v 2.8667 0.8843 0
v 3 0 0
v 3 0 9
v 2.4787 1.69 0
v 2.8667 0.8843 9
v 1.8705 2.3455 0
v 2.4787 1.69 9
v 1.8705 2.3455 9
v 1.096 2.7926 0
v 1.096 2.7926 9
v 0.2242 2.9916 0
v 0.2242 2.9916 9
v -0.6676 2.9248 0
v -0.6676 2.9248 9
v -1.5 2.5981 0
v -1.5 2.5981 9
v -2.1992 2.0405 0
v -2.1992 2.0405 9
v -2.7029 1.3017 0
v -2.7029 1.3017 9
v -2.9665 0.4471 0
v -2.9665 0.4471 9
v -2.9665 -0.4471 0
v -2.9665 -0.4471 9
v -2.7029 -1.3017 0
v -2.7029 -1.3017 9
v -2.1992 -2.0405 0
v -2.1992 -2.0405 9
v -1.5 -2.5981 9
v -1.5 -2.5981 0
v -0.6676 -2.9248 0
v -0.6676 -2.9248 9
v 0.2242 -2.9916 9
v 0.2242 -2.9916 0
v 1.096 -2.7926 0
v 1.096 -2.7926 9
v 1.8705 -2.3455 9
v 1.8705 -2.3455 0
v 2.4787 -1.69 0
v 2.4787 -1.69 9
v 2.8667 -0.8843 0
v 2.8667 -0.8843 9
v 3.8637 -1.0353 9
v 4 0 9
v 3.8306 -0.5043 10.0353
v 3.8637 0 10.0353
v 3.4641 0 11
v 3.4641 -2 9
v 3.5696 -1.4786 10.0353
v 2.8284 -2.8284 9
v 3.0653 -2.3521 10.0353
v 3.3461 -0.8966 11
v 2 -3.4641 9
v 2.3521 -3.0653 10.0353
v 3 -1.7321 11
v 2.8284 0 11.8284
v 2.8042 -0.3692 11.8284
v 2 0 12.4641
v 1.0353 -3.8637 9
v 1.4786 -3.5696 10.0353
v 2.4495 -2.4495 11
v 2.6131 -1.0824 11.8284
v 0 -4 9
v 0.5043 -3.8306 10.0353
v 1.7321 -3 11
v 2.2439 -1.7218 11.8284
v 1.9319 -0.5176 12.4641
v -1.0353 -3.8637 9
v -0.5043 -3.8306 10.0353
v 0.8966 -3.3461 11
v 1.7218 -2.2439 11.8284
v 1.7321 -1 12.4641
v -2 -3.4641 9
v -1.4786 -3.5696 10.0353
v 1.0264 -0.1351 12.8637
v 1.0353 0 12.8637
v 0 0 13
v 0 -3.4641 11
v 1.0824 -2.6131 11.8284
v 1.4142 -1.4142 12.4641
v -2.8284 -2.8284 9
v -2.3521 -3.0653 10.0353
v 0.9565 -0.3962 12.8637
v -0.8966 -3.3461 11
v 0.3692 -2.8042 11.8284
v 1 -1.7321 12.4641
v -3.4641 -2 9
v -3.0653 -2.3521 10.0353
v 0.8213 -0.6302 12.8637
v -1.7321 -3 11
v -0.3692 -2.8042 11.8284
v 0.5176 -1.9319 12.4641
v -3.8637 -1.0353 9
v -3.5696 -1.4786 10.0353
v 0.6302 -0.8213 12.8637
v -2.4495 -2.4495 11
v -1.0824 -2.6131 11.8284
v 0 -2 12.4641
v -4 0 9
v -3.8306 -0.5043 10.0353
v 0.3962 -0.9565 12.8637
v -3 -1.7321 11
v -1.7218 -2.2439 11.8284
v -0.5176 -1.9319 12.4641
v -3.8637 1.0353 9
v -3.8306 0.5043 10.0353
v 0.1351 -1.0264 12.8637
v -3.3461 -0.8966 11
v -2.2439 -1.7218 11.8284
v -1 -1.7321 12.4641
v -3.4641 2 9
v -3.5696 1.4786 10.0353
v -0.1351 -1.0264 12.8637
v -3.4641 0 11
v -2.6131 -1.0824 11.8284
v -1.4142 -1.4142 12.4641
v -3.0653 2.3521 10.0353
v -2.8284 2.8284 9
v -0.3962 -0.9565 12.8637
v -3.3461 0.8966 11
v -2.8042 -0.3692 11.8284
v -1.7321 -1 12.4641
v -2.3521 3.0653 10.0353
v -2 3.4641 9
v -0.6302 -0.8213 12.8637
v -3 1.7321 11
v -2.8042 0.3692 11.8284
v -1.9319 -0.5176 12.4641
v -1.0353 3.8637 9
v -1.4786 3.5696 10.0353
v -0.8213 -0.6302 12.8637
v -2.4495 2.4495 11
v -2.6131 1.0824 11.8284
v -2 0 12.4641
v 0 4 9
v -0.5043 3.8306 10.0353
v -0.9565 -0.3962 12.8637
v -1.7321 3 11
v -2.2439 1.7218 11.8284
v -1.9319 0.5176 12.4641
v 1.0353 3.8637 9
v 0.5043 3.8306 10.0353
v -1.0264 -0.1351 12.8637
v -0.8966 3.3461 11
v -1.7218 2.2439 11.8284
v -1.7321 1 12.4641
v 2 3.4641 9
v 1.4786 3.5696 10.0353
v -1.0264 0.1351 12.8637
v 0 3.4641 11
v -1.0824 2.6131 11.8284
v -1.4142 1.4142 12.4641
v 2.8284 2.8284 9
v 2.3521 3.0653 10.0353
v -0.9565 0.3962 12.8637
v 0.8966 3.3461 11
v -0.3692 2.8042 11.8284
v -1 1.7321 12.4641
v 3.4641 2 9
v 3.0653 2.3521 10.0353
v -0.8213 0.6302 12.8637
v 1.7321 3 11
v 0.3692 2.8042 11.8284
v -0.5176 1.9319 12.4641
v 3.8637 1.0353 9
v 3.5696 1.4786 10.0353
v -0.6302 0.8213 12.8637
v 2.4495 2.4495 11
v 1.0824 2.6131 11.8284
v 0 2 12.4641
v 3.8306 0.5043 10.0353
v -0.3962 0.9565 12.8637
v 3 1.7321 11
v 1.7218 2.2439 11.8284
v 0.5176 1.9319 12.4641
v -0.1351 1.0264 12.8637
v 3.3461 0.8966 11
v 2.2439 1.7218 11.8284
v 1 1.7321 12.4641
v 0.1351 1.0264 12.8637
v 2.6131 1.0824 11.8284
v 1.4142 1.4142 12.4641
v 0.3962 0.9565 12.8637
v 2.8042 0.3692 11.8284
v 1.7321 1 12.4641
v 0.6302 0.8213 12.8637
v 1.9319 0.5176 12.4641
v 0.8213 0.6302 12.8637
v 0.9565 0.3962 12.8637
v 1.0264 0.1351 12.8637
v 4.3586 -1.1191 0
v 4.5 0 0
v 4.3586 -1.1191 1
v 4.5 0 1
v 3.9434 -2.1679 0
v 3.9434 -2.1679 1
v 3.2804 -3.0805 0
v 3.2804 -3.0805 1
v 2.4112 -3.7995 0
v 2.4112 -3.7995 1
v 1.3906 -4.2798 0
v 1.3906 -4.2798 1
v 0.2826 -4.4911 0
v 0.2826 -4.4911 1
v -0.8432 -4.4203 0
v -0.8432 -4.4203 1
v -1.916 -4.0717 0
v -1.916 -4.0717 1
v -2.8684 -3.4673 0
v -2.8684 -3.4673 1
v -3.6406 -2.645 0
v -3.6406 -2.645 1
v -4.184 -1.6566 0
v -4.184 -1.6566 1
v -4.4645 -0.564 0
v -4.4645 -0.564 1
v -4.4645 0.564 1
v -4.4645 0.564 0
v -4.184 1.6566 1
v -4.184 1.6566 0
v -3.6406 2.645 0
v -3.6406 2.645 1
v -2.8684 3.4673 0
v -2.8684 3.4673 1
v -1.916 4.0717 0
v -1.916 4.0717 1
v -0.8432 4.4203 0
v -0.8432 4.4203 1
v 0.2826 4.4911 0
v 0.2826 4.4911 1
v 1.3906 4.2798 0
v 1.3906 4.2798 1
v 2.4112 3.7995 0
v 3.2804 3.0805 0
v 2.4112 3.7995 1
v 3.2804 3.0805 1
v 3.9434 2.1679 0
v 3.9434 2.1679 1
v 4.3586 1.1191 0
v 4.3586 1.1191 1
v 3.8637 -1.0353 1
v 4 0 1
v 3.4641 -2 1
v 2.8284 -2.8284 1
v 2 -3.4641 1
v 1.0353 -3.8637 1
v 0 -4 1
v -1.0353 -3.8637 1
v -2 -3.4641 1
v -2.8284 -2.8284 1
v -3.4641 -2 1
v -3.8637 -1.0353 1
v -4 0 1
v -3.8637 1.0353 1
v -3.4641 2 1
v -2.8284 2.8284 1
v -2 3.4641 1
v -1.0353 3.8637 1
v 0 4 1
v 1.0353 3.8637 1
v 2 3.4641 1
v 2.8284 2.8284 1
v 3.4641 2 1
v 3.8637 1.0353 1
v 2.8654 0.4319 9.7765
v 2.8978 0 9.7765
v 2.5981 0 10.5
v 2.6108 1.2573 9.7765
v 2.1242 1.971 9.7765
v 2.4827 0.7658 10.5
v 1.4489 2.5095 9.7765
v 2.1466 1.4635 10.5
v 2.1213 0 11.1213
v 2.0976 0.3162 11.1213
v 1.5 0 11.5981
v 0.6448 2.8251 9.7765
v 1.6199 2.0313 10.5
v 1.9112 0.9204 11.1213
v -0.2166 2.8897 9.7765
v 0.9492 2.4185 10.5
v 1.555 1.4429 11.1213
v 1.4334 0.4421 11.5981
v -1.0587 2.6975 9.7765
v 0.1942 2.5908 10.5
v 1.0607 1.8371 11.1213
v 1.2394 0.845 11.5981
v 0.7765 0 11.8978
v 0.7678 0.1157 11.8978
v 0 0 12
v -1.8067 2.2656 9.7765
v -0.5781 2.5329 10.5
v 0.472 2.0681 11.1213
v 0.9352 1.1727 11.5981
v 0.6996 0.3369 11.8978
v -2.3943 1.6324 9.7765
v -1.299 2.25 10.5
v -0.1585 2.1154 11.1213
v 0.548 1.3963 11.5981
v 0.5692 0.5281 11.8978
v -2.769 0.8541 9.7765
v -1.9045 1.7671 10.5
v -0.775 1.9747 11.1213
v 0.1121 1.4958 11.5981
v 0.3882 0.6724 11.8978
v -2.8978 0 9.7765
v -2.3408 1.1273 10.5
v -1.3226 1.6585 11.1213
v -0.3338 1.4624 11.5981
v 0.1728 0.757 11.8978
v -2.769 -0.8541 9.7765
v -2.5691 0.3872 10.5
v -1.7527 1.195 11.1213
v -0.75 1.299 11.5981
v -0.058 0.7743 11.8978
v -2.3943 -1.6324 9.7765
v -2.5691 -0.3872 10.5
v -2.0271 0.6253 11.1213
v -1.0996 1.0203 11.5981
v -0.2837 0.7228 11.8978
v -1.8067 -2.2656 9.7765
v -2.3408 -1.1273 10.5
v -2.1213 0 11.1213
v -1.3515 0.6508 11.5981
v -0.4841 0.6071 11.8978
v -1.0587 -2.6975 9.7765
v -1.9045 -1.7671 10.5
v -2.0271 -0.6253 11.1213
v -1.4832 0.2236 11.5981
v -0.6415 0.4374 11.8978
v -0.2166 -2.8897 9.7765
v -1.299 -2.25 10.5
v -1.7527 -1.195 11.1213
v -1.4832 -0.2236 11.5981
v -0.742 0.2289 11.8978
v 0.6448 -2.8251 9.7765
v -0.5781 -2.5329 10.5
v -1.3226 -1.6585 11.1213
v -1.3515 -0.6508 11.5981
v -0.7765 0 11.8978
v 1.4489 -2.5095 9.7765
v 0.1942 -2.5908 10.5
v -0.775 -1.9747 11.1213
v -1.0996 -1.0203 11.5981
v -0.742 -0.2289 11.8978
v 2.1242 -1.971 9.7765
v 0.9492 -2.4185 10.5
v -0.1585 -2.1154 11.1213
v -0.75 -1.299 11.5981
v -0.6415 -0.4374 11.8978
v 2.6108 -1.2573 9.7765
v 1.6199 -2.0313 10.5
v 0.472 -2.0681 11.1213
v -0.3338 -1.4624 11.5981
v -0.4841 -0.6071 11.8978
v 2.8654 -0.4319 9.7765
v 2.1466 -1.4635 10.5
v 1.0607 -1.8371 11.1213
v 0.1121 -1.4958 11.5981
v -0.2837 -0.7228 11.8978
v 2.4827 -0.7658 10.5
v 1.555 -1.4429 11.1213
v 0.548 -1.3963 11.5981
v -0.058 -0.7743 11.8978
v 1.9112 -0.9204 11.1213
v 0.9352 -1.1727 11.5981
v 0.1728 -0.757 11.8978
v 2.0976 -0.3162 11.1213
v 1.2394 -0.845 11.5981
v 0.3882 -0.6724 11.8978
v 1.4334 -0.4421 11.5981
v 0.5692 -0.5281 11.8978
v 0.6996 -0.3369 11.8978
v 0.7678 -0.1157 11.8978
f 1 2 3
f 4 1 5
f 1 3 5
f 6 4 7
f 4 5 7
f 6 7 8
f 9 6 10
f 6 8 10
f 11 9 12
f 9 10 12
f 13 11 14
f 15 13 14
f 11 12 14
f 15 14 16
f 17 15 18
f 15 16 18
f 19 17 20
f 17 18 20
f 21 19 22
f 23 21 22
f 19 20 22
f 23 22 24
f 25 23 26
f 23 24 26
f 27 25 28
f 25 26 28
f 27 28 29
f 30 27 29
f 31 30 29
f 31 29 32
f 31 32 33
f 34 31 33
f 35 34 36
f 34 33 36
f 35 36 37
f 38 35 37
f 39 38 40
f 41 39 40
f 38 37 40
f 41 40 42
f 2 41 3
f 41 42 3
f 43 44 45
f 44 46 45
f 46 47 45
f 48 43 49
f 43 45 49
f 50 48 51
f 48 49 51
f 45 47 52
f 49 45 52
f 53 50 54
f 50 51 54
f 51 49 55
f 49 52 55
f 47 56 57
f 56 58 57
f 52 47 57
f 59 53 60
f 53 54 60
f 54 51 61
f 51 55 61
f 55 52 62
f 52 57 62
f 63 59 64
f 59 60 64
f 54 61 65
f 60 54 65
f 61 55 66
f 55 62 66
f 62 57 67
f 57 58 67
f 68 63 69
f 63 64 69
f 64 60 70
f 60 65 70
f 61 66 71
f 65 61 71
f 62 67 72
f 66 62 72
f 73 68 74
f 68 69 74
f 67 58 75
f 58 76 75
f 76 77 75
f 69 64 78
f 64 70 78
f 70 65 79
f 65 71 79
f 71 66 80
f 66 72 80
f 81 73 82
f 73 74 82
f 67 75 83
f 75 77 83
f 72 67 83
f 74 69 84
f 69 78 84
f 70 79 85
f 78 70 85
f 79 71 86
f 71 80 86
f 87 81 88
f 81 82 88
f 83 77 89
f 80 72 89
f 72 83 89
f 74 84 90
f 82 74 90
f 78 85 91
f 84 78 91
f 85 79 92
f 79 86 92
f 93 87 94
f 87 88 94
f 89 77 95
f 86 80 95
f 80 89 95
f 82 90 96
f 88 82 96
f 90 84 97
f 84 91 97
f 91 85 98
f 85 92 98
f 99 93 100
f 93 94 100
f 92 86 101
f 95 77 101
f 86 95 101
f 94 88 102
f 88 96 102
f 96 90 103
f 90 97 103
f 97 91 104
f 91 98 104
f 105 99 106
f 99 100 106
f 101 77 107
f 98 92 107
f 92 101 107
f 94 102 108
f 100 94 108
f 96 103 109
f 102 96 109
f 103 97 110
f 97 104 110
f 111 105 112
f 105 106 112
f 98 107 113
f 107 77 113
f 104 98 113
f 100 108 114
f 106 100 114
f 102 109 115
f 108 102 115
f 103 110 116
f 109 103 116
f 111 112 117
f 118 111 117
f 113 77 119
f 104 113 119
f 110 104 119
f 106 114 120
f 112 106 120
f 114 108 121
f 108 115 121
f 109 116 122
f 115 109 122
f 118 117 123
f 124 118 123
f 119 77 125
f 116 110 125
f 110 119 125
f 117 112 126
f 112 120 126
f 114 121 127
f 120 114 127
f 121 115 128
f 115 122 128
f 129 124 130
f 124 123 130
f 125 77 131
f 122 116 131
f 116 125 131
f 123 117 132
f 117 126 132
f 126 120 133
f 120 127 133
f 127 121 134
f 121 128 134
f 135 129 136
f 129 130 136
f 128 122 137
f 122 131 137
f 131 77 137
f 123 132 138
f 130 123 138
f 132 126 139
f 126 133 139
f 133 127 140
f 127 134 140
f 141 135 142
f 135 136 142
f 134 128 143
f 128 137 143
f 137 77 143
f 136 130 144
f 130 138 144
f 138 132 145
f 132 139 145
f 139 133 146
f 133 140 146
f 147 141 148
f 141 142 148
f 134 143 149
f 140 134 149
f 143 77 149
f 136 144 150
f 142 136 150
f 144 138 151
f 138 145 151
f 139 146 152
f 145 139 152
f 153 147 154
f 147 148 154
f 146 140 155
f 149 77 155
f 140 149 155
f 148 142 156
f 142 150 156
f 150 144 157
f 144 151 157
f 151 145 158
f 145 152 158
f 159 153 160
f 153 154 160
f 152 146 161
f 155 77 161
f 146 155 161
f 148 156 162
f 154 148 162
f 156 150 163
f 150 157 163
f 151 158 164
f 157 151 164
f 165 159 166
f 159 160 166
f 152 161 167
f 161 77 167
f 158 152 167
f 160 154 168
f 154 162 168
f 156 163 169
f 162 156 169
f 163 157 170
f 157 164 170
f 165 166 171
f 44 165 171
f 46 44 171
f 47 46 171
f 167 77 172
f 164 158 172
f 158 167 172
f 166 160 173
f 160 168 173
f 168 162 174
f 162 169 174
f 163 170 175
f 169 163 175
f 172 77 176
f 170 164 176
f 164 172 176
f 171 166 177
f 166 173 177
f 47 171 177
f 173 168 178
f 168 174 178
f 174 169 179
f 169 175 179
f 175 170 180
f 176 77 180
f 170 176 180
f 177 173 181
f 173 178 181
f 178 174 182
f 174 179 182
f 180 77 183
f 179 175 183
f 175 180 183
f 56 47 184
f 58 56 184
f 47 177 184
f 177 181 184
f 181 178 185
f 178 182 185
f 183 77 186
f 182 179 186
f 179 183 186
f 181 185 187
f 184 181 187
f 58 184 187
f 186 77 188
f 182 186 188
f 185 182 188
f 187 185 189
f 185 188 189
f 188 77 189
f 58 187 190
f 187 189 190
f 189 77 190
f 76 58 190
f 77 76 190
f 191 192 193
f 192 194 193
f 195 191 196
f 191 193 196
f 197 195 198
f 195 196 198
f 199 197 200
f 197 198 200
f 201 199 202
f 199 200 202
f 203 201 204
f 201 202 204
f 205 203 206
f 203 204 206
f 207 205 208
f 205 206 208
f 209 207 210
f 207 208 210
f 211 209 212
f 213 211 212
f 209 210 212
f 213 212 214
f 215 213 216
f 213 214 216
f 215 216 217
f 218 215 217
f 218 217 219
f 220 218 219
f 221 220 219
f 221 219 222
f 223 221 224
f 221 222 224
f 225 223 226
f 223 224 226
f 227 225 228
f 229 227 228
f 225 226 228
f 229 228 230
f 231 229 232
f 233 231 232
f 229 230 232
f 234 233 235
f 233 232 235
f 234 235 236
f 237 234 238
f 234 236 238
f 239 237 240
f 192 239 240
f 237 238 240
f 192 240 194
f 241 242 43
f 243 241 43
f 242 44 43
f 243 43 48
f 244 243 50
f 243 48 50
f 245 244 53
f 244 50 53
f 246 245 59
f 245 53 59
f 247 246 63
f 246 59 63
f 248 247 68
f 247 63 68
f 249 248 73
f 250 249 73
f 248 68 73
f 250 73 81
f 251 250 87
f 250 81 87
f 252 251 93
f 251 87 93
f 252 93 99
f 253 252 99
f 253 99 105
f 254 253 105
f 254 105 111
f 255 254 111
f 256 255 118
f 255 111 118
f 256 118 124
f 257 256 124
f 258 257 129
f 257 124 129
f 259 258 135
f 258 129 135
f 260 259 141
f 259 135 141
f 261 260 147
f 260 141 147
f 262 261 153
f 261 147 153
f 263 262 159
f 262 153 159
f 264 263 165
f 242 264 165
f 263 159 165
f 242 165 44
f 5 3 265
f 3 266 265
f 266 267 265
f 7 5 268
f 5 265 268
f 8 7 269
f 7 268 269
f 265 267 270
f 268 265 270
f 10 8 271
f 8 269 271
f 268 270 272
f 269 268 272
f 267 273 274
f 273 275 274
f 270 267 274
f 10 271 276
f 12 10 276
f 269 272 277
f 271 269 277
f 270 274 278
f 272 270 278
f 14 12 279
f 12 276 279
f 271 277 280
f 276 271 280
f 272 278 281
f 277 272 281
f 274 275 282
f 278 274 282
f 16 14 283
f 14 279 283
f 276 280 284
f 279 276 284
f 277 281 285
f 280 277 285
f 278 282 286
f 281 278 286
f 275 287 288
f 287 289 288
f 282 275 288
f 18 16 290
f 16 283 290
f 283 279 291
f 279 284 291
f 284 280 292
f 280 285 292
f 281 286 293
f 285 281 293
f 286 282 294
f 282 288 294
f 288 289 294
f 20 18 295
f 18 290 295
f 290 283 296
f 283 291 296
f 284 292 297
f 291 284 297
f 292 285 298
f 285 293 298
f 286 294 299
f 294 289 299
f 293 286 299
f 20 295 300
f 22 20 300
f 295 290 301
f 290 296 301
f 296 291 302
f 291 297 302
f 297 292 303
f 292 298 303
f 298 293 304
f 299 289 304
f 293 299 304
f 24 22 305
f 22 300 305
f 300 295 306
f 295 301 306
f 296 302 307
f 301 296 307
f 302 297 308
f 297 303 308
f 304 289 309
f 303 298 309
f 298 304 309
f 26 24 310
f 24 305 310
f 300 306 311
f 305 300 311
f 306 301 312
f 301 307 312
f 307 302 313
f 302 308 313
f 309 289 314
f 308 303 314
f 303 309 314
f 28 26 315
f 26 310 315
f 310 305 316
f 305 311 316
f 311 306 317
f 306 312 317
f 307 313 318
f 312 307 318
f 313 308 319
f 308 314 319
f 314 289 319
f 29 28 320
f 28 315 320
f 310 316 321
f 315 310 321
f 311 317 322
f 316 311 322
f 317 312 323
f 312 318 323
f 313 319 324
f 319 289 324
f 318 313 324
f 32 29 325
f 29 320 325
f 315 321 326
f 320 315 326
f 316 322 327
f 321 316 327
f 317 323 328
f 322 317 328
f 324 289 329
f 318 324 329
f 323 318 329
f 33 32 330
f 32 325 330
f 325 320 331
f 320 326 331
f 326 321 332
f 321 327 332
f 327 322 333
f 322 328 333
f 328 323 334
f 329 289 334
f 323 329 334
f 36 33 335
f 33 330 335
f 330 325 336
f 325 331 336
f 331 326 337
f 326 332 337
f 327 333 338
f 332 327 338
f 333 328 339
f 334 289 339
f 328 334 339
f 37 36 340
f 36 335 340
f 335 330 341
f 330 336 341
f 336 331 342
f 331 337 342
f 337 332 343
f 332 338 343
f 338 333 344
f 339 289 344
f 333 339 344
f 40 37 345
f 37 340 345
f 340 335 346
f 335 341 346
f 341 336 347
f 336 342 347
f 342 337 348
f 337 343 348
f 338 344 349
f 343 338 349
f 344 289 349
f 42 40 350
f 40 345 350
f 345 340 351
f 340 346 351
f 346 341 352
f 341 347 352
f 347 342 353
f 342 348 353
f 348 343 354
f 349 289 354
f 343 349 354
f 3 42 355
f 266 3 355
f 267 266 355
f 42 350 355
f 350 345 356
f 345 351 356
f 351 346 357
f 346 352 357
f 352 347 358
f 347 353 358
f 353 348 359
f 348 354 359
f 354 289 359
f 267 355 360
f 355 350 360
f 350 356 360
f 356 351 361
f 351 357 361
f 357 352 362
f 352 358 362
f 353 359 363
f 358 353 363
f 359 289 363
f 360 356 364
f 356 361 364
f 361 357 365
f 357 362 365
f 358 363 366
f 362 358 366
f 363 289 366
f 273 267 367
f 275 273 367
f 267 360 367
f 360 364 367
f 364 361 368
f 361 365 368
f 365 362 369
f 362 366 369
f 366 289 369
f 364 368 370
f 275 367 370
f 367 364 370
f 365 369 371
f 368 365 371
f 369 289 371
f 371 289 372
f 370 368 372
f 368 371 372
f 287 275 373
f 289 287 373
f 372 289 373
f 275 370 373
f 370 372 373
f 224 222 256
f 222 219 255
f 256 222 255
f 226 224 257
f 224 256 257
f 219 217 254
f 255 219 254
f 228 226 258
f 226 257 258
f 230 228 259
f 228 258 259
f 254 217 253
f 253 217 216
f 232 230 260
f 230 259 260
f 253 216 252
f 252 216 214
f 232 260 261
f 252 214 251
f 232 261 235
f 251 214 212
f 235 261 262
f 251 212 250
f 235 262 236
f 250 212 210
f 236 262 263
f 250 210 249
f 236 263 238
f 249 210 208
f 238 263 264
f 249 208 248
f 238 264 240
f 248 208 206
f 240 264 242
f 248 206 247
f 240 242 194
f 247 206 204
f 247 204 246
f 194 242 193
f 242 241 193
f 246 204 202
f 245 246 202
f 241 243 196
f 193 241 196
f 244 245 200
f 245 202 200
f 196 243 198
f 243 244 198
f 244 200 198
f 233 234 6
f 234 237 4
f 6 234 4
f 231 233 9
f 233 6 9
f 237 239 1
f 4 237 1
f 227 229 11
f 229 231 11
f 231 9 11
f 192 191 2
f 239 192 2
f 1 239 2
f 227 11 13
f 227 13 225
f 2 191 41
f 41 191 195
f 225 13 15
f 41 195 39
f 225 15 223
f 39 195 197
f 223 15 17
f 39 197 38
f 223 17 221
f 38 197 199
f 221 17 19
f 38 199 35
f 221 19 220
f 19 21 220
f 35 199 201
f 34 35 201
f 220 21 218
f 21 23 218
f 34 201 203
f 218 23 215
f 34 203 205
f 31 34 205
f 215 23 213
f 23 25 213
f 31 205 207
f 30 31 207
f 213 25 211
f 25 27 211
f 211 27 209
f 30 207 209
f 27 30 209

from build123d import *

# Parameters (mm, degrees)
SKETCH1_W = 4
SKETCH1_H = 8


# Read off the part's stored shape, not the designer's step: Shell1
with BuildPart() as part:
    # Sketch1 → Revolve1 (revolve)
    with BuildSketch(Plane.YZ, mode=Mode.PRIVATE) as revolve1_sk:
        with BuildLine():
            Line((0, 13), (0, 9))
            Line((0, 9), (4, 9))
            ThreePointArc((4, 9), (2.828427125, 11.828427125), (0, 13))
        make_face()
        with Locations((2, 5)):
            Rectangle(SKETCH1_W, SKETCH1_H)
        Polygon((4, 1), (0, 1), (0, 0), (4.5, 0), (4.5, 1), align=None)
    revolve(revolve1_sk.sketch.rotate(Axis((0, 0, 10.805456946), (0, 0, -1)), 90), axis=Axis((0, 0, 10.805456946), (0, 0, -1)))

    # Shell1 outline → Shell1 (revolve, cut)
    with BuildSketch(Plane.XZ):
        with BuildLine():
            Line((0, 0), (3, 0))
            Line((3, 0), (3, 8.999999997))
            ThreePointArc((3, 8.999999997), (2.121320345, 11.121320342), (0, 12))
            Line((0, 12), (0, 0))
        make_face()
    revolve(axis=Axis((0, 0, 0), (0, 0, 1)), mode=Mode.SUBTRACT)


solid = part.part
